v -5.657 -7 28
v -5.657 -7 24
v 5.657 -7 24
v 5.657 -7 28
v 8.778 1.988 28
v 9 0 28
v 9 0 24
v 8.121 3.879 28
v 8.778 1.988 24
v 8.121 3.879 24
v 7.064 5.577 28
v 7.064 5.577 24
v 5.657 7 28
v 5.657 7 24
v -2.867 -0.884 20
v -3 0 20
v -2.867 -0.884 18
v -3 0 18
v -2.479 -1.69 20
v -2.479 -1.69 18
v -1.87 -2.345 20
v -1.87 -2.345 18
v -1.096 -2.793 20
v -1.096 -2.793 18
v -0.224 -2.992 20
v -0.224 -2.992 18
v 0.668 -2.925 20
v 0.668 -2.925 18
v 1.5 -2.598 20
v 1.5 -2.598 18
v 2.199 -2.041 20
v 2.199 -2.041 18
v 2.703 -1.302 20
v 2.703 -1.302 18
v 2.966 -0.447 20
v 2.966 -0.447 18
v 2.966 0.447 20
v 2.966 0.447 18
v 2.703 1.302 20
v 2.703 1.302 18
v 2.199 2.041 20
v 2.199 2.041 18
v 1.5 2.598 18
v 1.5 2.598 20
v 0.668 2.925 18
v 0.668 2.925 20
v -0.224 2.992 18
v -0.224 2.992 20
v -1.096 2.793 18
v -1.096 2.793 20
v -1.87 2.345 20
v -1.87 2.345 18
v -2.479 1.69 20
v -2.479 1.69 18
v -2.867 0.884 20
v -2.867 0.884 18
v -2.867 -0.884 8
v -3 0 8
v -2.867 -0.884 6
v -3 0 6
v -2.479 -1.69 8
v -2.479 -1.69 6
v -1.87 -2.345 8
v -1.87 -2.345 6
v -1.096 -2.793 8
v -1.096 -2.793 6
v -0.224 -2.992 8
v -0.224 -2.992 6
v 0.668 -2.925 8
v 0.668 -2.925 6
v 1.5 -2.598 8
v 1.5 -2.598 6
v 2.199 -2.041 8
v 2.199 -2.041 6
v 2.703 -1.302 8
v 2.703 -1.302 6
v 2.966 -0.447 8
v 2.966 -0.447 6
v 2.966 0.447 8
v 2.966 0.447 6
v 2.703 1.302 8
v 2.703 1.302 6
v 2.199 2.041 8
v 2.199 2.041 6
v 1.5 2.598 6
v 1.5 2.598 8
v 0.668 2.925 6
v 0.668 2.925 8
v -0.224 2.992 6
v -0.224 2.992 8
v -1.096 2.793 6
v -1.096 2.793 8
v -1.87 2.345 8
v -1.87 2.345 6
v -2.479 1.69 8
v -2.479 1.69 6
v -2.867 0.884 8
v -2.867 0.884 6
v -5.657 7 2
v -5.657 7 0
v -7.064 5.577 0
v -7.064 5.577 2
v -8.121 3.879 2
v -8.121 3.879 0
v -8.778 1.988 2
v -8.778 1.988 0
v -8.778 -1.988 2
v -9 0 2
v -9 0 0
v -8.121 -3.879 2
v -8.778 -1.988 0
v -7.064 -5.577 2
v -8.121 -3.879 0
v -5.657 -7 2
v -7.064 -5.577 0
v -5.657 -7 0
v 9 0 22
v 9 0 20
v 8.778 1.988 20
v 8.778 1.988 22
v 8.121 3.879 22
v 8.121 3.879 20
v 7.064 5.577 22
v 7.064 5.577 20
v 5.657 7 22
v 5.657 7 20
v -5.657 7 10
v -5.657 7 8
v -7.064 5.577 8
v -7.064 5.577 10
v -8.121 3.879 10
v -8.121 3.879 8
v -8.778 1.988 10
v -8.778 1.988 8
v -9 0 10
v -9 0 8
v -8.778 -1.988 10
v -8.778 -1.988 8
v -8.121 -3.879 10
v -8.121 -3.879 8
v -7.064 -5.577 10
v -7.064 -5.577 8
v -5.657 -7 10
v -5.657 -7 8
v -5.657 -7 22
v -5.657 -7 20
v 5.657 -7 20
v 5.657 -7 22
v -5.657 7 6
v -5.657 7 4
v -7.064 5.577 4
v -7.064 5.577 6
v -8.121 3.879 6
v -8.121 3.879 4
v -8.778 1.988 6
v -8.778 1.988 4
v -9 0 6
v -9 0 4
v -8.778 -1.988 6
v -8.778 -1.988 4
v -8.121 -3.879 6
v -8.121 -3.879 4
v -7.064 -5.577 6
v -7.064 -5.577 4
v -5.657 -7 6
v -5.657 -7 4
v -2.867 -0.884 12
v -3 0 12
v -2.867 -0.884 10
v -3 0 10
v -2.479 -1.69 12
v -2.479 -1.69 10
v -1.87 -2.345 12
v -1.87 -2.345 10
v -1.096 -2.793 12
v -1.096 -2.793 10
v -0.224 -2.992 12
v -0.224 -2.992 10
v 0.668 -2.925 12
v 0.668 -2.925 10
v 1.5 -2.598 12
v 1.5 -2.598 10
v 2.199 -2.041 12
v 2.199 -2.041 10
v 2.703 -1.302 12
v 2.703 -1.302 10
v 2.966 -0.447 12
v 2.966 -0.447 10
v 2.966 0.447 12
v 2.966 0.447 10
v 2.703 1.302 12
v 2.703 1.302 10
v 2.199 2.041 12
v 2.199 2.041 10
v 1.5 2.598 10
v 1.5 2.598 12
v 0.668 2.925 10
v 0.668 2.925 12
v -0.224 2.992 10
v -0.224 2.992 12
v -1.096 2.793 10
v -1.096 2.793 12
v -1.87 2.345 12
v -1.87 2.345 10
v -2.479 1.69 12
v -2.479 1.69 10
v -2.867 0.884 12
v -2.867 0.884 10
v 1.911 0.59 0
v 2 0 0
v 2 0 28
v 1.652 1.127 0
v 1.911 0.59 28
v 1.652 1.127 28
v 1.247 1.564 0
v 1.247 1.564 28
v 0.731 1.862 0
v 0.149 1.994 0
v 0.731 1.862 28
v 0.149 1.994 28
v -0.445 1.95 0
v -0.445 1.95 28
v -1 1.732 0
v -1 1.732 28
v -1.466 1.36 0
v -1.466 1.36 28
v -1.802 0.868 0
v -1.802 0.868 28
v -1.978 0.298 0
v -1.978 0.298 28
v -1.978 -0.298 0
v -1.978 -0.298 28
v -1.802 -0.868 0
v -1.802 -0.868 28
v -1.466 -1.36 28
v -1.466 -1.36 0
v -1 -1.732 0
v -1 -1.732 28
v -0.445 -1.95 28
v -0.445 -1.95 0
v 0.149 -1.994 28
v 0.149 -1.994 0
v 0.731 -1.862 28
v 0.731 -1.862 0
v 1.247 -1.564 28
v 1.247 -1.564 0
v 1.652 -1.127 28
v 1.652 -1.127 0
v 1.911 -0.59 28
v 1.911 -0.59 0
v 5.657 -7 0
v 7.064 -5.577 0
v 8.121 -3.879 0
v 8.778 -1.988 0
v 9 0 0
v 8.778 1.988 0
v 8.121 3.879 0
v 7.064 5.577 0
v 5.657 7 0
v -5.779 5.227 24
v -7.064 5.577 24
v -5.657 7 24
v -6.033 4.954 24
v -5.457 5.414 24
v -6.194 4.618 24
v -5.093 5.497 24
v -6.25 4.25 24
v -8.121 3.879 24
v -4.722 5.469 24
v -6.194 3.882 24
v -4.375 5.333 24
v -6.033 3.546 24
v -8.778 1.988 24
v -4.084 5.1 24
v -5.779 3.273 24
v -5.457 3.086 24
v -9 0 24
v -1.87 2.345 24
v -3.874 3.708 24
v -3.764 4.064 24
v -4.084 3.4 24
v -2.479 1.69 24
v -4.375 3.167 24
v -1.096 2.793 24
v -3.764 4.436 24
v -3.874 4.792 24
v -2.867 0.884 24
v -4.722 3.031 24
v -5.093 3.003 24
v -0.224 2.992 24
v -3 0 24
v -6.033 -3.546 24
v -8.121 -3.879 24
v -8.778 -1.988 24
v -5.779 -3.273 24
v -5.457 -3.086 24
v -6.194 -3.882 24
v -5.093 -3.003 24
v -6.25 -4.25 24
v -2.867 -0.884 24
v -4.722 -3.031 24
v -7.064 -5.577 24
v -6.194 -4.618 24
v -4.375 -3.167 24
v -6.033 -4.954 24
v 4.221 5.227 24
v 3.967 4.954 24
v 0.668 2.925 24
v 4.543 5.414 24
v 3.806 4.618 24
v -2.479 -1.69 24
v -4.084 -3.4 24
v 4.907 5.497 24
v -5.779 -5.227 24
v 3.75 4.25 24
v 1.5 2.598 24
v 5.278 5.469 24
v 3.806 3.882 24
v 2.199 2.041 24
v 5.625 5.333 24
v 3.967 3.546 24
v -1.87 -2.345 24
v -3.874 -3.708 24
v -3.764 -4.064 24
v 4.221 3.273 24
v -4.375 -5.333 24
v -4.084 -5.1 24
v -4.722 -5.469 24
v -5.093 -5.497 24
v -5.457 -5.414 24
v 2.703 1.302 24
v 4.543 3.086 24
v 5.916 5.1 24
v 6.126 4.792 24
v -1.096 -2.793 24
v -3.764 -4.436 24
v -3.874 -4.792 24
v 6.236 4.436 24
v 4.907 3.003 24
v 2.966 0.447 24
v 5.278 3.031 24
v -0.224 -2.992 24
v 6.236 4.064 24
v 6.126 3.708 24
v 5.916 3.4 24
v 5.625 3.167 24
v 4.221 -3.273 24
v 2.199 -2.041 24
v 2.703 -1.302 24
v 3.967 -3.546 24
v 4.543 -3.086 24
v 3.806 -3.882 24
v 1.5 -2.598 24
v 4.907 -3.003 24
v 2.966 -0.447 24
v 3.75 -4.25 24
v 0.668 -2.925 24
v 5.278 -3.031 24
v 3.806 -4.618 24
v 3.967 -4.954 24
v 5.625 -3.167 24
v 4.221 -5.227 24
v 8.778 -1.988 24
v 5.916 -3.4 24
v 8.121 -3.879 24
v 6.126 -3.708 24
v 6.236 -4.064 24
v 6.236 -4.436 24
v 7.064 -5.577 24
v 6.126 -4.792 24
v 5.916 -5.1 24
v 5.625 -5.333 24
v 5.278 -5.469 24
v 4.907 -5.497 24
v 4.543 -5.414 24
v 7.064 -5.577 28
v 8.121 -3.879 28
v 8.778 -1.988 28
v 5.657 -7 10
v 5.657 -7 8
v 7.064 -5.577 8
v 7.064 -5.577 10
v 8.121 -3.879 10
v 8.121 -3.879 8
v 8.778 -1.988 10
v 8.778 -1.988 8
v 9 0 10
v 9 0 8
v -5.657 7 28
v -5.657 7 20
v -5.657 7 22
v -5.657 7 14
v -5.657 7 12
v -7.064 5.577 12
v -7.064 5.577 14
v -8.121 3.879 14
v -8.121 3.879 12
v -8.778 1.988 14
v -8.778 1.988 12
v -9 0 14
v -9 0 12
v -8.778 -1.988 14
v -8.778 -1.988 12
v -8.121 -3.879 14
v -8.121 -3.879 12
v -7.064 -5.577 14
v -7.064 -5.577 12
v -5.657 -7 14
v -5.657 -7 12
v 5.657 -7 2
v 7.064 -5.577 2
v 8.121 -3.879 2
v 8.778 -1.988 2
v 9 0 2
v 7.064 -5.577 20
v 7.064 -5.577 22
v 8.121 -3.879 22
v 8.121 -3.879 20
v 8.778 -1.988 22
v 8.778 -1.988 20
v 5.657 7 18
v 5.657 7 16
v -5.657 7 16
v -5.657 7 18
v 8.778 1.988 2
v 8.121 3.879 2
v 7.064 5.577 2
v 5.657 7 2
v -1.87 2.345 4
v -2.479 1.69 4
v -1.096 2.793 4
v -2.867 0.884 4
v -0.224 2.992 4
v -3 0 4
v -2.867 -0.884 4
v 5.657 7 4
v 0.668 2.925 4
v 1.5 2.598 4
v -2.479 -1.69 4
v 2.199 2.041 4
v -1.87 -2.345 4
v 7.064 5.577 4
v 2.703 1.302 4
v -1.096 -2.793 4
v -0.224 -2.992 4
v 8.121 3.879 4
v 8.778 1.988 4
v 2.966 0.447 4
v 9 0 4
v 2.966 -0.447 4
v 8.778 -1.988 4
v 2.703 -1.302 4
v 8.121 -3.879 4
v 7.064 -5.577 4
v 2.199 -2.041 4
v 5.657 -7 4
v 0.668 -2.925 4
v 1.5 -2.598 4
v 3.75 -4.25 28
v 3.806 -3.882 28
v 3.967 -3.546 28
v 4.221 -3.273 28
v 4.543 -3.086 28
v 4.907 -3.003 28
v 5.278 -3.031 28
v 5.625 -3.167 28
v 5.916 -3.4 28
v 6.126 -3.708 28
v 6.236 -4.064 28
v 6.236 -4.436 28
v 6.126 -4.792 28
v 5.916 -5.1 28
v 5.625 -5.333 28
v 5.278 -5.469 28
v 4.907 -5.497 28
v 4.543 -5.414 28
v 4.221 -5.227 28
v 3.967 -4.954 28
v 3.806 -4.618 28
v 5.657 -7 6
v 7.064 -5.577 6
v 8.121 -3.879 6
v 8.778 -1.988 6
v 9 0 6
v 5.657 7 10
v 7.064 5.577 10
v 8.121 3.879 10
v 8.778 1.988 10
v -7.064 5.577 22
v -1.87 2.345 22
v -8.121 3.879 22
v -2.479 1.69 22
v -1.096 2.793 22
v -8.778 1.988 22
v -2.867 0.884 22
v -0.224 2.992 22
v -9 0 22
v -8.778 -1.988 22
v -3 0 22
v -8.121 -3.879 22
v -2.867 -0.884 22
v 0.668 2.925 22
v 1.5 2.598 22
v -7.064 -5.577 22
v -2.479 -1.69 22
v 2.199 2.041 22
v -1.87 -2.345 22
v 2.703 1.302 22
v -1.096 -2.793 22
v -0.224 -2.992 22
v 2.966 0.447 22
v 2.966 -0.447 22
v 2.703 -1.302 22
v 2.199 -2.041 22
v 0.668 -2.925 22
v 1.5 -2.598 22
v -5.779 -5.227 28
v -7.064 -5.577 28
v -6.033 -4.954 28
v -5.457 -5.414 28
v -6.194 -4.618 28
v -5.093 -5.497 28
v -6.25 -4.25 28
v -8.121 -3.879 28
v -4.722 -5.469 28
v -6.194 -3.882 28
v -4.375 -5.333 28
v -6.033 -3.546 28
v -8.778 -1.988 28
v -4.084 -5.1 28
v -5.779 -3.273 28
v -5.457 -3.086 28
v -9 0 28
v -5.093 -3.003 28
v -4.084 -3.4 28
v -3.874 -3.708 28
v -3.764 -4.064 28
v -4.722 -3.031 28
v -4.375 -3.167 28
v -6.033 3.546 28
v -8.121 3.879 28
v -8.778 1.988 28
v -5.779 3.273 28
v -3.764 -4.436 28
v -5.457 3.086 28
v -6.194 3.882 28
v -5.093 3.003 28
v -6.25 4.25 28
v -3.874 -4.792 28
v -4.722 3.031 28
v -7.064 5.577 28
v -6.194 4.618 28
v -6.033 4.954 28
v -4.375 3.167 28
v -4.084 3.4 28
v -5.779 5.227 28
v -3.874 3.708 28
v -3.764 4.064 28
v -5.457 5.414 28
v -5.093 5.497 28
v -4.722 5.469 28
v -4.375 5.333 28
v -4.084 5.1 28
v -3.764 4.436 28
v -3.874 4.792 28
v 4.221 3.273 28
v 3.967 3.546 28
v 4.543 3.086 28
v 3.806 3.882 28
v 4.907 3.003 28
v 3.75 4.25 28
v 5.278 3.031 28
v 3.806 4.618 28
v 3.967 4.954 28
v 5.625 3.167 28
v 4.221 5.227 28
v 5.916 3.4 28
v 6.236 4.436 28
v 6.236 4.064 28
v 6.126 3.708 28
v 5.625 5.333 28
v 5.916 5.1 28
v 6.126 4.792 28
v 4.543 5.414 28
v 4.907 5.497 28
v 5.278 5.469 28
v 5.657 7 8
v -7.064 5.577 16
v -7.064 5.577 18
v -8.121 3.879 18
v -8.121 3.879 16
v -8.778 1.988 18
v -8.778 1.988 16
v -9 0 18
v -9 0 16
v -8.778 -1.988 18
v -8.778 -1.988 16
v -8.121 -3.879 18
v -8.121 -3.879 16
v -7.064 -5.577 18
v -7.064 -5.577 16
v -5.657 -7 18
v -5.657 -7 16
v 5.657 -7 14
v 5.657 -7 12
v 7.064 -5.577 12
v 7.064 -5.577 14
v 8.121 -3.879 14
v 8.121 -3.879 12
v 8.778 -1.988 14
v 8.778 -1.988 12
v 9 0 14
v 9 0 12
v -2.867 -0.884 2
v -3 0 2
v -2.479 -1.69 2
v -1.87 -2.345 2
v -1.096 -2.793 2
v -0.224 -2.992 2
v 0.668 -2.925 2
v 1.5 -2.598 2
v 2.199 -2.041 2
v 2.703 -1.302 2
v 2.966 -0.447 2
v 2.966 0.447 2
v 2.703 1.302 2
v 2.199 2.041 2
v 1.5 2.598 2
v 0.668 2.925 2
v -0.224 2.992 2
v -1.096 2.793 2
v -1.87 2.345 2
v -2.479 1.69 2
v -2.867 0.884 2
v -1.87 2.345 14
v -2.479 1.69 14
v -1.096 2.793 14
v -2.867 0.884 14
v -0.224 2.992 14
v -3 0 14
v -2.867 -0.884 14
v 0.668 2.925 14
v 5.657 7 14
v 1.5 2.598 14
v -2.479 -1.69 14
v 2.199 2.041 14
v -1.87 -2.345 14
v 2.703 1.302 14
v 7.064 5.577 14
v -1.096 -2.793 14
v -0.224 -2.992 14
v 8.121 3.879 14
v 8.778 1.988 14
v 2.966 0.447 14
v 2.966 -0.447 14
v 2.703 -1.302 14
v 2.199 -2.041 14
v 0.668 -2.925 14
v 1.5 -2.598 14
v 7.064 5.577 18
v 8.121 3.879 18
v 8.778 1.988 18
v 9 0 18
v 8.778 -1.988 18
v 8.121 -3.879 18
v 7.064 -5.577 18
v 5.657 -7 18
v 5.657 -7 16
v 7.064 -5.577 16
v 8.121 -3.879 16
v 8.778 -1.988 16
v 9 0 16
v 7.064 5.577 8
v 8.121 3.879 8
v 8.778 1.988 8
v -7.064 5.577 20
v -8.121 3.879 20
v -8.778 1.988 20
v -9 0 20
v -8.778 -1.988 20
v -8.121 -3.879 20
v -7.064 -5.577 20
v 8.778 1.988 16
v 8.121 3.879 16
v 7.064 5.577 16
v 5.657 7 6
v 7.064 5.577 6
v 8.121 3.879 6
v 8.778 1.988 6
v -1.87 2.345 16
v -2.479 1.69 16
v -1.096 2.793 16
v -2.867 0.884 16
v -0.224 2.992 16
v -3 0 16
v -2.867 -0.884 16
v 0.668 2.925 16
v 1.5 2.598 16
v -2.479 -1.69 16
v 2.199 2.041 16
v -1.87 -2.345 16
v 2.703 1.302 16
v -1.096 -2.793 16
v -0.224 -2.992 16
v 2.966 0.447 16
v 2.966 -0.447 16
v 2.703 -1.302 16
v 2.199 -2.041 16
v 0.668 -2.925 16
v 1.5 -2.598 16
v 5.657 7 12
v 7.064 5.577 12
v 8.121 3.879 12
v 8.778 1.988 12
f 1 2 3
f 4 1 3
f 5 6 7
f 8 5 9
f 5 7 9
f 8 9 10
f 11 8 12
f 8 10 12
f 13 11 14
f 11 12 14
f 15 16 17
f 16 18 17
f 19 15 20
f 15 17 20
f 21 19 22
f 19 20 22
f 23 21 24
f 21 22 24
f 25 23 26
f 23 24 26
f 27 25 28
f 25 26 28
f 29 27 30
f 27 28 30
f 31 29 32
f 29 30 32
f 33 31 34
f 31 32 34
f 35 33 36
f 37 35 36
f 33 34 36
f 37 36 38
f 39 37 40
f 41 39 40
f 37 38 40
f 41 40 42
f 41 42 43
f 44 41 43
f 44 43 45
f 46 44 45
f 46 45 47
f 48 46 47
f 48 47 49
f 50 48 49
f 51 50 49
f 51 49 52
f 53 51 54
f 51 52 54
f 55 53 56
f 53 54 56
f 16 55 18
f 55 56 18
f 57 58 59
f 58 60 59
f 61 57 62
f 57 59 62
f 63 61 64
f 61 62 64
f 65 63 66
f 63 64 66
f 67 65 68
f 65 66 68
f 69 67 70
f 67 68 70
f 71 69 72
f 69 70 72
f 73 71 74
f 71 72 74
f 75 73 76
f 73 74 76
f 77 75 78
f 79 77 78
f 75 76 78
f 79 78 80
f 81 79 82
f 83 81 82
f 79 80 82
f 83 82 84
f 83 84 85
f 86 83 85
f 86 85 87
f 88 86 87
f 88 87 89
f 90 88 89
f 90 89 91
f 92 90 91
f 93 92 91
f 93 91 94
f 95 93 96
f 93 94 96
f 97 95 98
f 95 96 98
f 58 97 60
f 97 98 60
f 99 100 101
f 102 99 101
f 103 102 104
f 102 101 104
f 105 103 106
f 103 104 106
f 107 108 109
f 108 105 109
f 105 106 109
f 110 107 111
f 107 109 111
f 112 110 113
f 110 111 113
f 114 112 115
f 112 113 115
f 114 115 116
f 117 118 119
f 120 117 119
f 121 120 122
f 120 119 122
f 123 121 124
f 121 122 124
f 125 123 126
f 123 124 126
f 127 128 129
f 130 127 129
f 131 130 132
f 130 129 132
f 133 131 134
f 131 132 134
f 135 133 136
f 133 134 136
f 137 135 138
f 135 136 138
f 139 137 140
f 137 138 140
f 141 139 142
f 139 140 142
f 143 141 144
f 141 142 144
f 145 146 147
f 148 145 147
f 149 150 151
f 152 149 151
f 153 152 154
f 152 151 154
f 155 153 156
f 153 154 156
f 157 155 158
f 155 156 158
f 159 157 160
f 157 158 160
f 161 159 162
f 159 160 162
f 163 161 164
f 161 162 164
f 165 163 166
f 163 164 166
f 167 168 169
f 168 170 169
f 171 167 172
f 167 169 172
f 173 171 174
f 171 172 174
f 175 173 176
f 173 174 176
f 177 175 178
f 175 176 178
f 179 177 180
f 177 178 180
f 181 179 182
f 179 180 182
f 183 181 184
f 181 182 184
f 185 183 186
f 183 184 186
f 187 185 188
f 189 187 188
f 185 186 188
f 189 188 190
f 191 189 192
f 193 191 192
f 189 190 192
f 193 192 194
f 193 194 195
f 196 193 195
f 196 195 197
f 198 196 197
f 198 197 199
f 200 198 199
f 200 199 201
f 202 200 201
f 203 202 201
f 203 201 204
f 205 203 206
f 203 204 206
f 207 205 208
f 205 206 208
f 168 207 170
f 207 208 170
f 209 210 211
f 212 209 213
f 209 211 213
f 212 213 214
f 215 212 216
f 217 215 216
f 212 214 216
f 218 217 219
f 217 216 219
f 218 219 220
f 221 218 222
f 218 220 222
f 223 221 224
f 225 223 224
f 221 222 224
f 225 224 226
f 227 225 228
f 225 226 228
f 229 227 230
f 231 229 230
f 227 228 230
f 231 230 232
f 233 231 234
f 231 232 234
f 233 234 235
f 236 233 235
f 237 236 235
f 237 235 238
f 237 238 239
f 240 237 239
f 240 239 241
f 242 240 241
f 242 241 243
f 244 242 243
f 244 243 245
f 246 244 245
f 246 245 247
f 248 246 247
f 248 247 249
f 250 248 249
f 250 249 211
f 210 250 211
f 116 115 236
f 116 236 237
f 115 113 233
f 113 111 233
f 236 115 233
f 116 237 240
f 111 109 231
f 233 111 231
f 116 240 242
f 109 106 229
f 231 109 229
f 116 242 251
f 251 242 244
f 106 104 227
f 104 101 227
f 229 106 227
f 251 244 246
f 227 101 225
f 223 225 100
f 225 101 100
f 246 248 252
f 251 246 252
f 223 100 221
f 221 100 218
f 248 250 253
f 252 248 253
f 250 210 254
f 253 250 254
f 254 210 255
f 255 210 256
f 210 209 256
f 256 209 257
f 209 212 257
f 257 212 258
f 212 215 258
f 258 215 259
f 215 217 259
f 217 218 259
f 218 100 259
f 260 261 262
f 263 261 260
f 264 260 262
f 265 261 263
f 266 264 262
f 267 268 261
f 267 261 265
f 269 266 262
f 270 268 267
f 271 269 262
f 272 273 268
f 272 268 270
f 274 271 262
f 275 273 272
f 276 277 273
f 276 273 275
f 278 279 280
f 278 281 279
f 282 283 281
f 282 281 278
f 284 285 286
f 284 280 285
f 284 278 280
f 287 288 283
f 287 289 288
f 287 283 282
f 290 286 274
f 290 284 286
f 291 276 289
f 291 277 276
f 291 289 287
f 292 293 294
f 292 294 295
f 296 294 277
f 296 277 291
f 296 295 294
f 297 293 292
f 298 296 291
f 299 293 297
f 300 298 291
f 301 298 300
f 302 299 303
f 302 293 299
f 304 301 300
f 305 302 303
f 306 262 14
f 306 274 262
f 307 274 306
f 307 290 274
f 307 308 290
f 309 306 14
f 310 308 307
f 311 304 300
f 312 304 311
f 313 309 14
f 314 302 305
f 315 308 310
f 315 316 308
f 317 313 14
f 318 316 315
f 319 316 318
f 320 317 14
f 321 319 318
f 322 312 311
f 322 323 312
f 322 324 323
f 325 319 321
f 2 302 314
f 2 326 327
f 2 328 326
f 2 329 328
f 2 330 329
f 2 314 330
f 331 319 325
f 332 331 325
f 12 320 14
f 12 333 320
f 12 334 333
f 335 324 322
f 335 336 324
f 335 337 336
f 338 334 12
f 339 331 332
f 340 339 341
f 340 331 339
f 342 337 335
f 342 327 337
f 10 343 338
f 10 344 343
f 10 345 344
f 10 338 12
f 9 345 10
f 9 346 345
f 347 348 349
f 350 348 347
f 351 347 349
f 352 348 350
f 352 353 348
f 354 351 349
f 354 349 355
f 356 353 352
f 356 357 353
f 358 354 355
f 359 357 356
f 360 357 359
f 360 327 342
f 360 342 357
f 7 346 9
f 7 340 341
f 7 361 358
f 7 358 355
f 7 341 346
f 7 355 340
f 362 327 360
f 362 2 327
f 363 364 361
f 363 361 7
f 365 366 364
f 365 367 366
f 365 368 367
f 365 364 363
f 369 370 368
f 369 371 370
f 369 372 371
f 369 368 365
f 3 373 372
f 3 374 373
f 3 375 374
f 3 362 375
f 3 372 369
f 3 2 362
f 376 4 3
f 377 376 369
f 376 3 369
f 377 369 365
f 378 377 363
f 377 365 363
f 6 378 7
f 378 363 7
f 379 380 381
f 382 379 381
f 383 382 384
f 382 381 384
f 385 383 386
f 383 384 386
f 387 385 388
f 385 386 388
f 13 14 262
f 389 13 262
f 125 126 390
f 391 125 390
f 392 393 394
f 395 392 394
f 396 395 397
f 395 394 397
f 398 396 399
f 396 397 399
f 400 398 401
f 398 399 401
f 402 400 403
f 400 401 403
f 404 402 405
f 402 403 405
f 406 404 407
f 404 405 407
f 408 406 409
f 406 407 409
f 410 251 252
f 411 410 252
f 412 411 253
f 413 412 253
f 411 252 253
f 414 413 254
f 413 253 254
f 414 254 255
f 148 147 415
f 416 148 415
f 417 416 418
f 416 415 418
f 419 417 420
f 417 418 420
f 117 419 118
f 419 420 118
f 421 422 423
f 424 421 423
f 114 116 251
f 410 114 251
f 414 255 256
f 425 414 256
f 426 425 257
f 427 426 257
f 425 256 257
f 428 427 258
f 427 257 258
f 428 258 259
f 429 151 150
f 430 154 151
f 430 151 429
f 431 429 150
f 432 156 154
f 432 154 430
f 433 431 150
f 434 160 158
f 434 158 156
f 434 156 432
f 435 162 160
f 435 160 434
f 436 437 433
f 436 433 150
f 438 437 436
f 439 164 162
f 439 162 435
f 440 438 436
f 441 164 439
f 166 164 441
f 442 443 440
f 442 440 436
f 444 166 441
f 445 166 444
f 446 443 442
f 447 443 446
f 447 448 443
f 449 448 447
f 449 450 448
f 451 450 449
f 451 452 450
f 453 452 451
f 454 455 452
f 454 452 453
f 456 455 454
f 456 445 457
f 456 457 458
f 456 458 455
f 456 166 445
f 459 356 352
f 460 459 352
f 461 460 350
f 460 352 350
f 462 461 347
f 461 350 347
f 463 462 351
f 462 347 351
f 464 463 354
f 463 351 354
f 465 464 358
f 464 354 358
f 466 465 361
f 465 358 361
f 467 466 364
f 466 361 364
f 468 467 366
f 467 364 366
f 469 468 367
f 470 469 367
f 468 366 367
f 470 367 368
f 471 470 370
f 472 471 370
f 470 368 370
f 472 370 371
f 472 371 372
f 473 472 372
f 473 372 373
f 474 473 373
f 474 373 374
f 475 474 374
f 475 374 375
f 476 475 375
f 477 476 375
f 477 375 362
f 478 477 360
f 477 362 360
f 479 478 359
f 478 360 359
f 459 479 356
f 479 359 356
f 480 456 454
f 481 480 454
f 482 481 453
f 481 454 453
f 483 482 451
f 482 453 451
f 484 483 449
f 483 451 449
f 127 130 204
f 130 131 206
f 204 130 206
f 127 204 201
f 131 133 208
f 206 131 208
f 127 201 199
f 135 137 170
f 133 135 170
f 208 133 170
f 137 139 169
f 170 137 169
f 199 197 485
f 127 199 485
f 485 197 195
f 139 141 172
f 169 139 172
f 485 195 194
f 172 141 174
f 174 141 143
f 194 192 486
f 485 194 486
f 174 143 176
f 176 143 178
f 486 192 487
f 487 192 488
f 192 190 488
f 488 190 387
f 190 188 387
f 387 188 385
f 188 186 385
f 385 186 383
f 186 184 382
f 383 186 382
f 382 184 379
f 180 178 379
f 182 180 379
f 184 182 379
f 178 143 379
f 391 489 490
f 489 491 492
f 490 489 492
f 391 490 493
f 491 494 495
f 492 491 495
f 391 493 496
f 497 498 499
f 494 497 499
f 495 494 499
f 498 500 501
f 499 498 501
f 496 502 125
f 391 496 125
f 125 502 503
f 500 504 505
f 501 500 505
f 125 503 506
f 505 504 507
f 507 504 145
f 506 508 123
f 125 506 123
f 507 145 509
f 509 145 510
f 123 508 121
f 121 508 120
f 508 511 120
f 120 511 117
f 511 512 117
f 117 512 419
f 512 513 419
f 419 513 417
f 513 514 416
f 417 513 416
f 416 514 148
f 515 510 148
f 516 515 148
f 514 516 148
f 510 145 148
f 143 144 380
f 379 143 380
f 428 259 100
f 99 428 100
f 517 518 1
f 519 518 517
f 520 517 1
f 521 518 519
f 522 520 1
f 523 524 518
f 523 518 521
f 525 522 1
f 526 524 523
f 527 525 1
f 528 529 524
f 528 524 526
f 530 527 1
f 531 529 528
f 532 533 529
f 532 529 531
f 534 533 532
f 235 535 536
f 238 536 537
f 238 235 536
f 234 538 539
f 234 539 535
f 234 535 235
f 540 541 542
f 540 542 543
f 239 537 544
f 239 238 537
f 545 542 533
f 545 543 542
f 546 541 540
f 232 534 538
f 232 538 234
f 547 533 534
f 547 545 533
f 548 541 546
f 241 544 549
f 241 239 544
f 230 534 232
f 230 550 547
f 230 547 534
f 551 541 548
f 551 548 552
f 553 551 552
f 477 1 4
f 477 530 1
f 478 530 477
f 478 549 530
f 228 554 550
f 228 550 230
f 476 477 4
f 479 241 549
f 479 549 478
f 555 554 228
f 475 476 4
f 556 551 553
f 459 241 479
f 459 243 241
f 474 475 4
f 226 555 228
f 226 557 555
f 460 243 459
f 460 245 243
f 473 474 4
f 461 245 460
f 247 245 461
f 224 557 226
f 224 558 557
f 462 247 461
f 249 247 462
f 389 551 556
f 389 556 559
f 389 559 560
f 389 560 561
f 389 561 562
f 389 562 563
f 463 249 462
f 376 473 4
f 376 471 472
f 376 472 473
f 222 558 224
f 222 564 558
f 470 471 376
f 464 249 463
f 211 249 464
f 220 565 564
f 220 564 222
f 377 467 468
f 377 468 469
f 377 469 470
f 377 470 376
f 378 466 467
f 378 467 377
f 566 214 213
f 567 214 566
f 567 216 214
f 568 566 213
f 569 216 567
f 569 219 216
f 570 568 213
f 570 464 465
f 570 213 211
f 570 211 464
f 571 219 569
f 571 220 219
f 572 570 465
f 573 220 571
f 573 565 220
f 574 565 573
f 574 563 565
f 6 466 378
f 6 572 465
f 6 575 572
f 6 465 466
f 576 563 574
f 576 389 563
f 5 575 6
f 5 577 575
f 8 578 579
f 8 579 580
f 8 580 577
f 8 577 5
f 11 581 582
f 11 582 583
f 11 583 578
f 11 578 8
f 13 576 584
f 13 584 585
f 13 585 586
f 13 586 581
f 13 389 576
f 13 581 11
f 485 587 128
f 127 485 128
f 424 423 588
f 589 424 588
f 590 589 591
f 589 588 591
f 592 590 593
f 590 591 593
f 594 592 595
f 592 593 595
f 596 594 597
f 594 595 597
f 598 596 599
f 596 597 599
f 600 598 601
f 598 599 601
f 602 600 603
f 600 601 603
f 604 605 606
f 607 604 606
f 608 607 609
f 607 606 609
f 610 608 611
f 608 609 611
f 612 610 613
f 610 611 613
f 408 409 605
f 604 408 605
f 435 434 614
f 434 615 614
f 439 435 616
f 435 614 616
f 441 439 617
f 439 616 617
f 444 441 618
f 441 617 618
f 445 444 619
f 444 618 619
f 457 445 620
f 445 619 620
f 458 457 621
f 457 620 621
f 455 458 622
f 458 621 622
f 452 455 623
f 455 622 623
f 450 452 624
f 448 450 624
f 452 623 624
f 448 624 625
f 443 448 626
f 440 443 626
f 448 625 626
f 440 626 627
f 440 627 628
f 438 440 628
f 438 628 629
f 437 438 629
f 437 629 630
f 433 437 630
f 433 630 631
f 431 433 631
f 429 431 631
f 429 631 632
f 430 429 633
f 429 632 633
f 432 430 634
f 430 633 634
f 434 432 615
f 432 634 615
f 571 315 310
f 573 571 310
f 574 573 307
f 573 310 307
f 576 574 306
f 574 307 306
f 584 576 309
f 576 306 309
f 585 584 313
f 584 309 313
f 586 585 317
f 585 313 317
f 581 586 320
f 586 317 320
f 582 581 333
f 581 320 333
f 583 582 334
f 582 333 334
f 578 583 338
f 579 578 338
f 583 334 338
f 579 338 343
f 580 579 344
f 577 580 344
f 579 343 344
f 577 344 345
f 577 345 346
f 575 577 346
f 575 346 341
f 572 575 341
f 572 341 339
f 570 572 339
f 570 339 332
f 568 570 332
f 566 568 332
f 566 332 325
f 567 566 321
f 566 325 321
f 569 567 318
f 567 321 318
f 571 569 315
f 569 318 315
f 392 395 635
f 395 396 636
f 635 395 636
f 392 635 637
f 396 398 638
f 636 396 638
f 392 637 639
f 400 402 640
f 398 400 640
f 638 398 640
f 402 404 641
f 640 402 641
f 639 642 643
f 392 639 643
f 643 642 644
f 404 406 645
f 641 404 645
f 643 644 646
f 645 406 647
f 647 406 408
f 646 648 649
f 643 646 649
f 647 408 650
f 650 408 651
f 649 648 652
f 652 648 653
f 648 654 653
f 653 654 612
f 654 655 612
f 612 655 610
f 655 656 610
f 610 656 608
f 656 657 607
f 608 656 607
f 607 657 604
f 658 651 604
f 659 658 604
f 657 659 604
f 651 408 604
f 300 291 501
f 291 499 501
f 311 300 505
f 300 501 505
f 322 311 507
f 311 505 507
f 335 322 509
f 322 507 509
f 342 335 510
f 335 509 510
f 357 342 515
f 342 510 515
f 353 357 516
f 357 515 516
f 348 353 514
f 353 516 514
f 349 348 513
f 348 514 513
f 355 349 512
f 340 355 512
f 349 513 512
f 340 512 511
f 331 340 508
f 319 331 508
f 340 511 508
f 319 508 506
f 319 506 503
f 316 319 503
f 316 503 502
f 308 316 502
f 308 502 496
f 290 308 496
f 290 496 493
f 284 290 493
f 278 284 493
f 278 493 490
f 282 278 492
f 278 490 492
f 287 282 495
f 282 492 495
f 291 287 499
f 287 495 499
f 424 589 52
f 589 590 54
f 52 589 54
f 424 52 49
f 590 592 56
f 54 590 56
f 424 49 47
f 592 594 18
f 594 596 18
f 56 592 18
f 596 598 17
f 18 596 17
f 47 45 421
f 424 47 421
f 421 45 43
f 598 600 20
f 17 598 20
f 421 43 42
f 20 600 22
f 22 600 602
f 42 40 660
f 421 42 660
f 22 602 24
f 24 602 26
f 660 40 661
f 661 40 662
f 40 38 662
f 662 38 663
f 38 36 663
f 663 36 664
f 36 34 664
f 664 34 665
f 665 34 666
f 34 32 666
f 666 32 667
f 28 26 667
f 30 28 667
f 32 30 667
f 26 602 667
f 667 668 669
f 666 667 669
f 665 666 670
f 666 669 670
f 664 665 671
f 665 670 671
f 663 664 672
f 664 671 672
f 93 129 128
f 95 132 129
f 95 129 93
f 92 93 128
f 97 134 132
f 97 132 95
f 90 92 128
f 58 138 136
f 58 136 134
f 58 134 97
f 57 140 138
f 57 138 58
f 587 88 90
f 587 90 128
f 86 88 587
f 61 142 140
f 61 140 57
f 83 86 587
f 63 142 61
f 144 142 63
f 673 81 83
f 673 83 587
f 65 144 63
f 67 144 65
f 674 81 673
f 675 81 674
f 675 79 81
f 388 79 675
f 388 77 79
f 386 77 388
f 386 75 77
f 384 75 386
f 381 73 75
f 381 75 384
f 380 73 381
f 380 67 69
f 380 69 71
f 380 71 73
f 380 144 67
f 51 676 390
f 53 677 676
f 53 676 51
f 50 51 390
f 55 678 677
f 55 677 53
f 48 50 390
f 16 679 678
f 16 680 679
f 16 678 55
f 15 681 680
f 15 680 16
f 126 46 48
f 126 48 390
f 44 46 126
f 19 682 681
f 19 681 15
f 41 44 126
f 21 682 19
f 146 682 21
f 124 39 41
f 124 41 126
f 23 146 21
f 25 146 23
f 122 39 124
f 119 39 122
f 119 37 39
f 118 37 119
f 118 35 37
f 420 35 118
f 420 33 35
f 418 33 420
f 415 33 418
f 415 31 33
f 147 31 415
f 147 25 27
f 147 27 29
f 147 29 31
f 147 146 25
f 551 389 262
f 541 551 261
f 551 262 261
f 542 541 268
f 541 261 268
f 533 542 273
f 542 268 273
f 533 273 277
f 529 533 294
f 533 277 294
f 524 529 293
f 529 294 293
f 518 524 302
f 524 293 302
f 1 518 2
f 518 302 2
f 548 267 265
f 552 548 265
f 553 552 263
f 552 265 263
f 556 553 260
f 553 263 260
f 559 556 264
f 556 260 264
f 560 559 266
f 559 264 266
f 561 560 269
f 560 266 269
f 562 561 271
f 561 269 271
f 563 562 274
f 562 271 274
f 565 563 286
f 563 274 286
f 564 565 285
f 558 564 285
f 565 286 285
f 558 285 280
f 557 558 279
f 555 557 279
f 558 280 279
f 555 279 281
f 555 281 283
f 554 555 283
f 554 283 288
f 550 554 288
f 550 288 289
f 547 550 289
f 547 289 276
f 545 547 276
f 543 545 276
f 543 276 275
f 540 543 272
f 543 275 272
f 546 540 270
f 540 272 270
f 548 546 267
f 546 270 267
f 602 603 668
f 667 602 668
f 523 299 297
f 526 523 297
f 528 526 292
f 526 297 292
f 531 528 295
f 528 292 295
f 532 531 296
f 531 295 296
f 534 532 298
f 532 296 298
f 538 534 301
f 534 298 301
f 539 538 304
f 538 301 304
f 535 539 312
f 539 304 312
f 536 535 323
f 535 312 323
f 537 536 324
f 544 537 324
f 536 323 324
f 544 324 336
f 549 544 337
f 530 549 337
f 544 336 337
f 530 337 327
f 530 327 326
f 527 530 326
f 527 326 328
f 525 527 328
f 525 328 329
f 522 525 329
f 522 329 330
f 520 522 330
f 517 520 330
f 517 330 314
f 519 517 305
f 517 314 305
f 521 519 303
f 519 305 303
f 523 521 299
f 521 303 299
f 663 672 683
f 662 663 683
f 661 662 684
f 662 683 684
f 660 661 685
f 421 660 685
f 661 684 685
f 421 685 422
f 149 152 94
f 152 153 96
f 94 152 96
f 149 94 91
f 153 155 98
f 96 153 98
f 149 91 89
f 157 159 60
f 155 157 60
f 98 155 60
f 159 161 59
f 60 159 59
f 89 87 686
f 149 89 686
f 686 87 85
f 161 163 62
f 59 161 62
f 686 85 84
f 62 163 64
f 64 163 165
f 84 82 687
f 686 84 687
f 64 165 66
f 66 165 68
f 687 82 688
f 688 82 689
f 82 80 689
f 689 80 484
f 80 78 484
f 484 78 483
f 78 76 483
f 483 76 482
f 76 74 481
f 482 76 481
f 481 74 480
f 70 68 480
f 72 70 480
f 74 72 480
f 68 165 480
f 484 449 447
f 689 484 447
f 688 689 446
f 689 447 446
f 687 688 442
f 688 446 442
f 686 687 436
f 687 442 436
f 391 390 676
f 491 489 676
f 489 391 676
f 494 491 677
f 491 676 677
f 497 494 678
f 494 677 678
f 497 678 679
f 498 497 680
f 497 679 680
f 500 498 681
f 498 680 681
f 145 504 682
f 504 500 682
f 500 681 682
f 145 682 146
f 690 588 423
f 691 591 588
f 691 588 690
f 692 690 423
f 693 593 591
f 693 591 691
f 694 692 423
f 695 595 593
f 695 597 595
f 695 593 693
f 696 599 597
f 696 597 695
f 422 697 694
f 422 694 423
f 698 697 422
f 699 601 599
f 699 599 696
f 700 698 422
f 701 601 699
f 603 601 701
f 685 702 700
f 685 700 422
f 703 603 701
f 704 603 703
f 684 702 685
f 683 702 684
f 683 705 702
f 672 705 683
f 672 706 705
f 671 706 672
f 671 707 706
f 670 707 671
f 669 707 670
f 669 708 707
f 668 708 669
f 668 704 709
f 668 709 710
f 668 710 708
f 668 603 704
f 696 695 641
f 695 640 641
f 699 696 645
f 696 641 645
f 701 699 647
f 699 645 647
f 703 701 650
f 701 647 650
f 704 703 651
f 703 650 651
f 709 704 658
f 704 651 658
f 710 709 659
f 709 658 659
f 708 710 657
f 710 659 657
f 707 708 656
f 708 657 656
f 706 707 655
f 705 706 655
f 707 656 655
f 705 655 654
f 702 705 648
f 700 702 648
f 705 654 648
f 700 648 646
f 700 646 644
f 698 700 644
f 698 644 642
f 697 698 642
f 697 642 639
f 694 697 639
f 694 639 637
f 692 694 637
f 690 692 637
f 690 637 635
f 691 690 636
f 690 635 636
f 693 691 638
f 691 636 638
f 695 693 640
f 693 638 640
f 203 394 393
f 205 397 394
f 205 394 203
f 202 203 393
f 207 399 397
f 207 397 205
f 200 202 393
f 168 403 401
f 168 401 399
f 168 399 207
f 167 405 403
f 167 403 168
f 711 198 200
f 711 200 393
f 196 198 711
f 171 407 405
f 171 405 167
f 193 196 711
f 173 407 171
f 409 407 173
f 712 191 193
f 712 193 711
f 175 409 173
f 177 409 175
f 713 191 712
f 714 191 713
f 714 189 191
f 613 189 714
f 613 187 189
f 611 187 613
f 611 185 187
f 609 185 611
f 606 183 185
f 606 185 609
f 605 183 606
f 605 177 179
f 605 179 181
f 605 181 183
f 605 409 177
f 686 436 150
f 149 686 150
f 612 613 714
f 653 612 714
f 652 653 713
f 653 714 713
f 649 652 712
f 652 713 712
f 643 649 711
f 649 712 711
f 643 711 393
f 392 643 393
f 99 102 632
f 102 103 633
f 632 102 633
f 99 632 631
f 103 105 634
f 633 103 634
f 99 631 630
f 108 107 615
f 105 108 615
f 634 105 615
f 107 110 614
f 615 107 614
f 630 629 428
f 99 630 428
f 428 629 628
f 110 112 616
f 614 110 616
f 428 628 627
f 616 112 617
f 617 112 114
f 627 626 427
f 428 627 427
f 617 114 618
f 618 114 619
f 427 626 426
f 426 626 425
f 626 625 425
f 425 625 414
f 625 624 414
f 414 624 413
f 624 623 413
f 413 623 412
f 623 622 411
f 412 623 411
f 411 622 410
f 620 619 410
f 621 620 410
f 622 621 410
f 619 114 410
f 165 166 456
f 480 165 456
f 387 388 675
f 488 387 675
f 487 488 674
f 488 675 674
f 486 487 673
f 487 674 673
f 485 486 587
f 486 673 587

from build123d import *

# Parameters (mm, degrees)
ESTRUSIONE_ESTRUSIONE1_DEPTH = 28
FORO_FILETTATO_M3_1_D        = 2.5
FORO_FILETTATO_M3_1_DEPTH    = 4.5
FORO_FILETTATO_M3_1_TIP      = 0.751075774
SCHIZZO4_R                   = 2
TAGLIO_ESTRUSIONE1_DEPTH     = 31.232432916
SCHIZZO5_W                   = 6
SCHIZZO5_H                   = 2
RIPETIZIONE_A_L1_COUNT       = 7
RIPETIZIONE_A_L1_PITCH       = 4


with BuildPart() as part:
    # Schizzo1 → Estrusione-Estrusione1 (new body)
    with BuildSketch(Plane.XY):
        with BuildLine():
            Line((5.656854249, 7), (-5.656854249, 7))
            ThreePointArc((-5.656854249, 7), (-9, 0), (-5.656854249, -7))
            Line((-5.656854249, -7), (5.656854249, -7))
            ThreePointArc((5.656854249, -7), (8.121320344, -3.878679656), (9, 0))
            ThreePointArc((9, 0), (8.121320344, 3.878679656), (5.656854249, 7))
        make_face()
    extrude(amount=ESTRUSIONE_ESTRUSIONE1_DEPTH)

    # Foro filettato M3-1
    with Locations(Plane(origin=(-5, 4.25, 28), x_dir=(1, 0, 0), z_dir=(0, 0, 1))):
        with Locations((0, 0), (10, 0), (0, -8.5), (10, -8.5)):
            Hole(FORO_FILETTATO_M3_1_D / 2, depth=FORO_FILETTATO_M3_1_DEPTH)
            with Locations((0, 0, -(FORO_FILETTATO_M3_1_DEPTH + FORO_FILETTATO_M3_1_TIP / 2))):  # 118° drill point
                Cone(0, FORO_FILETTATO_M3_1_D / 2, FORO_FILETTATO_M3_1_TIP, mode=Mode.SUBTRACT)

    # Schizzo4 → Taglio-Estrusione1 (cut, through all)
    with BuildSketch(Plane.XY.offset(28)):
        Circle(SCHIZZO4_R)
    extrude(amount=-TAGLIO_ESTRUSIONE1_DEPTH, mode=Mode.SUBTRACT)

    # Schizzo5 → Taglia-Rivoluzione1 (revolve, cut)
    with BuildSketch(Plane(origin=(0, 0, 0), x_dir=(1, 0, 0), z_dir=(0, 1, 0)), mode=Mode.PRIVATE) as taglia_rivoluzione1_sk:
        with Locations((6, -23)):
            Rectangle(SCHIZZO5_W, SCHIZZO5_H)
    taglia_rivoluzione1 = revolve(taglia_rivoluzione1_sk.sketch.rotate(Axis((0, 0, 0), (0, 0, 1)), 180), axis=Axis((0, 0, 0), (0, 0, 1)), mode=Mode.SUBTRACT)

    # Ripetizione a L1: Taglia-Rivoluzione1 ×7
    with Locations(*[(0, 0, -i * RIPETIZIONE_A_L1_PITCH) for i in range(1, RIPETIZIONE_A_L1_COUNT)]):
        add(taglia_rivoluzione1, mode=Mode.SUBTRACT)


solid = part.part
